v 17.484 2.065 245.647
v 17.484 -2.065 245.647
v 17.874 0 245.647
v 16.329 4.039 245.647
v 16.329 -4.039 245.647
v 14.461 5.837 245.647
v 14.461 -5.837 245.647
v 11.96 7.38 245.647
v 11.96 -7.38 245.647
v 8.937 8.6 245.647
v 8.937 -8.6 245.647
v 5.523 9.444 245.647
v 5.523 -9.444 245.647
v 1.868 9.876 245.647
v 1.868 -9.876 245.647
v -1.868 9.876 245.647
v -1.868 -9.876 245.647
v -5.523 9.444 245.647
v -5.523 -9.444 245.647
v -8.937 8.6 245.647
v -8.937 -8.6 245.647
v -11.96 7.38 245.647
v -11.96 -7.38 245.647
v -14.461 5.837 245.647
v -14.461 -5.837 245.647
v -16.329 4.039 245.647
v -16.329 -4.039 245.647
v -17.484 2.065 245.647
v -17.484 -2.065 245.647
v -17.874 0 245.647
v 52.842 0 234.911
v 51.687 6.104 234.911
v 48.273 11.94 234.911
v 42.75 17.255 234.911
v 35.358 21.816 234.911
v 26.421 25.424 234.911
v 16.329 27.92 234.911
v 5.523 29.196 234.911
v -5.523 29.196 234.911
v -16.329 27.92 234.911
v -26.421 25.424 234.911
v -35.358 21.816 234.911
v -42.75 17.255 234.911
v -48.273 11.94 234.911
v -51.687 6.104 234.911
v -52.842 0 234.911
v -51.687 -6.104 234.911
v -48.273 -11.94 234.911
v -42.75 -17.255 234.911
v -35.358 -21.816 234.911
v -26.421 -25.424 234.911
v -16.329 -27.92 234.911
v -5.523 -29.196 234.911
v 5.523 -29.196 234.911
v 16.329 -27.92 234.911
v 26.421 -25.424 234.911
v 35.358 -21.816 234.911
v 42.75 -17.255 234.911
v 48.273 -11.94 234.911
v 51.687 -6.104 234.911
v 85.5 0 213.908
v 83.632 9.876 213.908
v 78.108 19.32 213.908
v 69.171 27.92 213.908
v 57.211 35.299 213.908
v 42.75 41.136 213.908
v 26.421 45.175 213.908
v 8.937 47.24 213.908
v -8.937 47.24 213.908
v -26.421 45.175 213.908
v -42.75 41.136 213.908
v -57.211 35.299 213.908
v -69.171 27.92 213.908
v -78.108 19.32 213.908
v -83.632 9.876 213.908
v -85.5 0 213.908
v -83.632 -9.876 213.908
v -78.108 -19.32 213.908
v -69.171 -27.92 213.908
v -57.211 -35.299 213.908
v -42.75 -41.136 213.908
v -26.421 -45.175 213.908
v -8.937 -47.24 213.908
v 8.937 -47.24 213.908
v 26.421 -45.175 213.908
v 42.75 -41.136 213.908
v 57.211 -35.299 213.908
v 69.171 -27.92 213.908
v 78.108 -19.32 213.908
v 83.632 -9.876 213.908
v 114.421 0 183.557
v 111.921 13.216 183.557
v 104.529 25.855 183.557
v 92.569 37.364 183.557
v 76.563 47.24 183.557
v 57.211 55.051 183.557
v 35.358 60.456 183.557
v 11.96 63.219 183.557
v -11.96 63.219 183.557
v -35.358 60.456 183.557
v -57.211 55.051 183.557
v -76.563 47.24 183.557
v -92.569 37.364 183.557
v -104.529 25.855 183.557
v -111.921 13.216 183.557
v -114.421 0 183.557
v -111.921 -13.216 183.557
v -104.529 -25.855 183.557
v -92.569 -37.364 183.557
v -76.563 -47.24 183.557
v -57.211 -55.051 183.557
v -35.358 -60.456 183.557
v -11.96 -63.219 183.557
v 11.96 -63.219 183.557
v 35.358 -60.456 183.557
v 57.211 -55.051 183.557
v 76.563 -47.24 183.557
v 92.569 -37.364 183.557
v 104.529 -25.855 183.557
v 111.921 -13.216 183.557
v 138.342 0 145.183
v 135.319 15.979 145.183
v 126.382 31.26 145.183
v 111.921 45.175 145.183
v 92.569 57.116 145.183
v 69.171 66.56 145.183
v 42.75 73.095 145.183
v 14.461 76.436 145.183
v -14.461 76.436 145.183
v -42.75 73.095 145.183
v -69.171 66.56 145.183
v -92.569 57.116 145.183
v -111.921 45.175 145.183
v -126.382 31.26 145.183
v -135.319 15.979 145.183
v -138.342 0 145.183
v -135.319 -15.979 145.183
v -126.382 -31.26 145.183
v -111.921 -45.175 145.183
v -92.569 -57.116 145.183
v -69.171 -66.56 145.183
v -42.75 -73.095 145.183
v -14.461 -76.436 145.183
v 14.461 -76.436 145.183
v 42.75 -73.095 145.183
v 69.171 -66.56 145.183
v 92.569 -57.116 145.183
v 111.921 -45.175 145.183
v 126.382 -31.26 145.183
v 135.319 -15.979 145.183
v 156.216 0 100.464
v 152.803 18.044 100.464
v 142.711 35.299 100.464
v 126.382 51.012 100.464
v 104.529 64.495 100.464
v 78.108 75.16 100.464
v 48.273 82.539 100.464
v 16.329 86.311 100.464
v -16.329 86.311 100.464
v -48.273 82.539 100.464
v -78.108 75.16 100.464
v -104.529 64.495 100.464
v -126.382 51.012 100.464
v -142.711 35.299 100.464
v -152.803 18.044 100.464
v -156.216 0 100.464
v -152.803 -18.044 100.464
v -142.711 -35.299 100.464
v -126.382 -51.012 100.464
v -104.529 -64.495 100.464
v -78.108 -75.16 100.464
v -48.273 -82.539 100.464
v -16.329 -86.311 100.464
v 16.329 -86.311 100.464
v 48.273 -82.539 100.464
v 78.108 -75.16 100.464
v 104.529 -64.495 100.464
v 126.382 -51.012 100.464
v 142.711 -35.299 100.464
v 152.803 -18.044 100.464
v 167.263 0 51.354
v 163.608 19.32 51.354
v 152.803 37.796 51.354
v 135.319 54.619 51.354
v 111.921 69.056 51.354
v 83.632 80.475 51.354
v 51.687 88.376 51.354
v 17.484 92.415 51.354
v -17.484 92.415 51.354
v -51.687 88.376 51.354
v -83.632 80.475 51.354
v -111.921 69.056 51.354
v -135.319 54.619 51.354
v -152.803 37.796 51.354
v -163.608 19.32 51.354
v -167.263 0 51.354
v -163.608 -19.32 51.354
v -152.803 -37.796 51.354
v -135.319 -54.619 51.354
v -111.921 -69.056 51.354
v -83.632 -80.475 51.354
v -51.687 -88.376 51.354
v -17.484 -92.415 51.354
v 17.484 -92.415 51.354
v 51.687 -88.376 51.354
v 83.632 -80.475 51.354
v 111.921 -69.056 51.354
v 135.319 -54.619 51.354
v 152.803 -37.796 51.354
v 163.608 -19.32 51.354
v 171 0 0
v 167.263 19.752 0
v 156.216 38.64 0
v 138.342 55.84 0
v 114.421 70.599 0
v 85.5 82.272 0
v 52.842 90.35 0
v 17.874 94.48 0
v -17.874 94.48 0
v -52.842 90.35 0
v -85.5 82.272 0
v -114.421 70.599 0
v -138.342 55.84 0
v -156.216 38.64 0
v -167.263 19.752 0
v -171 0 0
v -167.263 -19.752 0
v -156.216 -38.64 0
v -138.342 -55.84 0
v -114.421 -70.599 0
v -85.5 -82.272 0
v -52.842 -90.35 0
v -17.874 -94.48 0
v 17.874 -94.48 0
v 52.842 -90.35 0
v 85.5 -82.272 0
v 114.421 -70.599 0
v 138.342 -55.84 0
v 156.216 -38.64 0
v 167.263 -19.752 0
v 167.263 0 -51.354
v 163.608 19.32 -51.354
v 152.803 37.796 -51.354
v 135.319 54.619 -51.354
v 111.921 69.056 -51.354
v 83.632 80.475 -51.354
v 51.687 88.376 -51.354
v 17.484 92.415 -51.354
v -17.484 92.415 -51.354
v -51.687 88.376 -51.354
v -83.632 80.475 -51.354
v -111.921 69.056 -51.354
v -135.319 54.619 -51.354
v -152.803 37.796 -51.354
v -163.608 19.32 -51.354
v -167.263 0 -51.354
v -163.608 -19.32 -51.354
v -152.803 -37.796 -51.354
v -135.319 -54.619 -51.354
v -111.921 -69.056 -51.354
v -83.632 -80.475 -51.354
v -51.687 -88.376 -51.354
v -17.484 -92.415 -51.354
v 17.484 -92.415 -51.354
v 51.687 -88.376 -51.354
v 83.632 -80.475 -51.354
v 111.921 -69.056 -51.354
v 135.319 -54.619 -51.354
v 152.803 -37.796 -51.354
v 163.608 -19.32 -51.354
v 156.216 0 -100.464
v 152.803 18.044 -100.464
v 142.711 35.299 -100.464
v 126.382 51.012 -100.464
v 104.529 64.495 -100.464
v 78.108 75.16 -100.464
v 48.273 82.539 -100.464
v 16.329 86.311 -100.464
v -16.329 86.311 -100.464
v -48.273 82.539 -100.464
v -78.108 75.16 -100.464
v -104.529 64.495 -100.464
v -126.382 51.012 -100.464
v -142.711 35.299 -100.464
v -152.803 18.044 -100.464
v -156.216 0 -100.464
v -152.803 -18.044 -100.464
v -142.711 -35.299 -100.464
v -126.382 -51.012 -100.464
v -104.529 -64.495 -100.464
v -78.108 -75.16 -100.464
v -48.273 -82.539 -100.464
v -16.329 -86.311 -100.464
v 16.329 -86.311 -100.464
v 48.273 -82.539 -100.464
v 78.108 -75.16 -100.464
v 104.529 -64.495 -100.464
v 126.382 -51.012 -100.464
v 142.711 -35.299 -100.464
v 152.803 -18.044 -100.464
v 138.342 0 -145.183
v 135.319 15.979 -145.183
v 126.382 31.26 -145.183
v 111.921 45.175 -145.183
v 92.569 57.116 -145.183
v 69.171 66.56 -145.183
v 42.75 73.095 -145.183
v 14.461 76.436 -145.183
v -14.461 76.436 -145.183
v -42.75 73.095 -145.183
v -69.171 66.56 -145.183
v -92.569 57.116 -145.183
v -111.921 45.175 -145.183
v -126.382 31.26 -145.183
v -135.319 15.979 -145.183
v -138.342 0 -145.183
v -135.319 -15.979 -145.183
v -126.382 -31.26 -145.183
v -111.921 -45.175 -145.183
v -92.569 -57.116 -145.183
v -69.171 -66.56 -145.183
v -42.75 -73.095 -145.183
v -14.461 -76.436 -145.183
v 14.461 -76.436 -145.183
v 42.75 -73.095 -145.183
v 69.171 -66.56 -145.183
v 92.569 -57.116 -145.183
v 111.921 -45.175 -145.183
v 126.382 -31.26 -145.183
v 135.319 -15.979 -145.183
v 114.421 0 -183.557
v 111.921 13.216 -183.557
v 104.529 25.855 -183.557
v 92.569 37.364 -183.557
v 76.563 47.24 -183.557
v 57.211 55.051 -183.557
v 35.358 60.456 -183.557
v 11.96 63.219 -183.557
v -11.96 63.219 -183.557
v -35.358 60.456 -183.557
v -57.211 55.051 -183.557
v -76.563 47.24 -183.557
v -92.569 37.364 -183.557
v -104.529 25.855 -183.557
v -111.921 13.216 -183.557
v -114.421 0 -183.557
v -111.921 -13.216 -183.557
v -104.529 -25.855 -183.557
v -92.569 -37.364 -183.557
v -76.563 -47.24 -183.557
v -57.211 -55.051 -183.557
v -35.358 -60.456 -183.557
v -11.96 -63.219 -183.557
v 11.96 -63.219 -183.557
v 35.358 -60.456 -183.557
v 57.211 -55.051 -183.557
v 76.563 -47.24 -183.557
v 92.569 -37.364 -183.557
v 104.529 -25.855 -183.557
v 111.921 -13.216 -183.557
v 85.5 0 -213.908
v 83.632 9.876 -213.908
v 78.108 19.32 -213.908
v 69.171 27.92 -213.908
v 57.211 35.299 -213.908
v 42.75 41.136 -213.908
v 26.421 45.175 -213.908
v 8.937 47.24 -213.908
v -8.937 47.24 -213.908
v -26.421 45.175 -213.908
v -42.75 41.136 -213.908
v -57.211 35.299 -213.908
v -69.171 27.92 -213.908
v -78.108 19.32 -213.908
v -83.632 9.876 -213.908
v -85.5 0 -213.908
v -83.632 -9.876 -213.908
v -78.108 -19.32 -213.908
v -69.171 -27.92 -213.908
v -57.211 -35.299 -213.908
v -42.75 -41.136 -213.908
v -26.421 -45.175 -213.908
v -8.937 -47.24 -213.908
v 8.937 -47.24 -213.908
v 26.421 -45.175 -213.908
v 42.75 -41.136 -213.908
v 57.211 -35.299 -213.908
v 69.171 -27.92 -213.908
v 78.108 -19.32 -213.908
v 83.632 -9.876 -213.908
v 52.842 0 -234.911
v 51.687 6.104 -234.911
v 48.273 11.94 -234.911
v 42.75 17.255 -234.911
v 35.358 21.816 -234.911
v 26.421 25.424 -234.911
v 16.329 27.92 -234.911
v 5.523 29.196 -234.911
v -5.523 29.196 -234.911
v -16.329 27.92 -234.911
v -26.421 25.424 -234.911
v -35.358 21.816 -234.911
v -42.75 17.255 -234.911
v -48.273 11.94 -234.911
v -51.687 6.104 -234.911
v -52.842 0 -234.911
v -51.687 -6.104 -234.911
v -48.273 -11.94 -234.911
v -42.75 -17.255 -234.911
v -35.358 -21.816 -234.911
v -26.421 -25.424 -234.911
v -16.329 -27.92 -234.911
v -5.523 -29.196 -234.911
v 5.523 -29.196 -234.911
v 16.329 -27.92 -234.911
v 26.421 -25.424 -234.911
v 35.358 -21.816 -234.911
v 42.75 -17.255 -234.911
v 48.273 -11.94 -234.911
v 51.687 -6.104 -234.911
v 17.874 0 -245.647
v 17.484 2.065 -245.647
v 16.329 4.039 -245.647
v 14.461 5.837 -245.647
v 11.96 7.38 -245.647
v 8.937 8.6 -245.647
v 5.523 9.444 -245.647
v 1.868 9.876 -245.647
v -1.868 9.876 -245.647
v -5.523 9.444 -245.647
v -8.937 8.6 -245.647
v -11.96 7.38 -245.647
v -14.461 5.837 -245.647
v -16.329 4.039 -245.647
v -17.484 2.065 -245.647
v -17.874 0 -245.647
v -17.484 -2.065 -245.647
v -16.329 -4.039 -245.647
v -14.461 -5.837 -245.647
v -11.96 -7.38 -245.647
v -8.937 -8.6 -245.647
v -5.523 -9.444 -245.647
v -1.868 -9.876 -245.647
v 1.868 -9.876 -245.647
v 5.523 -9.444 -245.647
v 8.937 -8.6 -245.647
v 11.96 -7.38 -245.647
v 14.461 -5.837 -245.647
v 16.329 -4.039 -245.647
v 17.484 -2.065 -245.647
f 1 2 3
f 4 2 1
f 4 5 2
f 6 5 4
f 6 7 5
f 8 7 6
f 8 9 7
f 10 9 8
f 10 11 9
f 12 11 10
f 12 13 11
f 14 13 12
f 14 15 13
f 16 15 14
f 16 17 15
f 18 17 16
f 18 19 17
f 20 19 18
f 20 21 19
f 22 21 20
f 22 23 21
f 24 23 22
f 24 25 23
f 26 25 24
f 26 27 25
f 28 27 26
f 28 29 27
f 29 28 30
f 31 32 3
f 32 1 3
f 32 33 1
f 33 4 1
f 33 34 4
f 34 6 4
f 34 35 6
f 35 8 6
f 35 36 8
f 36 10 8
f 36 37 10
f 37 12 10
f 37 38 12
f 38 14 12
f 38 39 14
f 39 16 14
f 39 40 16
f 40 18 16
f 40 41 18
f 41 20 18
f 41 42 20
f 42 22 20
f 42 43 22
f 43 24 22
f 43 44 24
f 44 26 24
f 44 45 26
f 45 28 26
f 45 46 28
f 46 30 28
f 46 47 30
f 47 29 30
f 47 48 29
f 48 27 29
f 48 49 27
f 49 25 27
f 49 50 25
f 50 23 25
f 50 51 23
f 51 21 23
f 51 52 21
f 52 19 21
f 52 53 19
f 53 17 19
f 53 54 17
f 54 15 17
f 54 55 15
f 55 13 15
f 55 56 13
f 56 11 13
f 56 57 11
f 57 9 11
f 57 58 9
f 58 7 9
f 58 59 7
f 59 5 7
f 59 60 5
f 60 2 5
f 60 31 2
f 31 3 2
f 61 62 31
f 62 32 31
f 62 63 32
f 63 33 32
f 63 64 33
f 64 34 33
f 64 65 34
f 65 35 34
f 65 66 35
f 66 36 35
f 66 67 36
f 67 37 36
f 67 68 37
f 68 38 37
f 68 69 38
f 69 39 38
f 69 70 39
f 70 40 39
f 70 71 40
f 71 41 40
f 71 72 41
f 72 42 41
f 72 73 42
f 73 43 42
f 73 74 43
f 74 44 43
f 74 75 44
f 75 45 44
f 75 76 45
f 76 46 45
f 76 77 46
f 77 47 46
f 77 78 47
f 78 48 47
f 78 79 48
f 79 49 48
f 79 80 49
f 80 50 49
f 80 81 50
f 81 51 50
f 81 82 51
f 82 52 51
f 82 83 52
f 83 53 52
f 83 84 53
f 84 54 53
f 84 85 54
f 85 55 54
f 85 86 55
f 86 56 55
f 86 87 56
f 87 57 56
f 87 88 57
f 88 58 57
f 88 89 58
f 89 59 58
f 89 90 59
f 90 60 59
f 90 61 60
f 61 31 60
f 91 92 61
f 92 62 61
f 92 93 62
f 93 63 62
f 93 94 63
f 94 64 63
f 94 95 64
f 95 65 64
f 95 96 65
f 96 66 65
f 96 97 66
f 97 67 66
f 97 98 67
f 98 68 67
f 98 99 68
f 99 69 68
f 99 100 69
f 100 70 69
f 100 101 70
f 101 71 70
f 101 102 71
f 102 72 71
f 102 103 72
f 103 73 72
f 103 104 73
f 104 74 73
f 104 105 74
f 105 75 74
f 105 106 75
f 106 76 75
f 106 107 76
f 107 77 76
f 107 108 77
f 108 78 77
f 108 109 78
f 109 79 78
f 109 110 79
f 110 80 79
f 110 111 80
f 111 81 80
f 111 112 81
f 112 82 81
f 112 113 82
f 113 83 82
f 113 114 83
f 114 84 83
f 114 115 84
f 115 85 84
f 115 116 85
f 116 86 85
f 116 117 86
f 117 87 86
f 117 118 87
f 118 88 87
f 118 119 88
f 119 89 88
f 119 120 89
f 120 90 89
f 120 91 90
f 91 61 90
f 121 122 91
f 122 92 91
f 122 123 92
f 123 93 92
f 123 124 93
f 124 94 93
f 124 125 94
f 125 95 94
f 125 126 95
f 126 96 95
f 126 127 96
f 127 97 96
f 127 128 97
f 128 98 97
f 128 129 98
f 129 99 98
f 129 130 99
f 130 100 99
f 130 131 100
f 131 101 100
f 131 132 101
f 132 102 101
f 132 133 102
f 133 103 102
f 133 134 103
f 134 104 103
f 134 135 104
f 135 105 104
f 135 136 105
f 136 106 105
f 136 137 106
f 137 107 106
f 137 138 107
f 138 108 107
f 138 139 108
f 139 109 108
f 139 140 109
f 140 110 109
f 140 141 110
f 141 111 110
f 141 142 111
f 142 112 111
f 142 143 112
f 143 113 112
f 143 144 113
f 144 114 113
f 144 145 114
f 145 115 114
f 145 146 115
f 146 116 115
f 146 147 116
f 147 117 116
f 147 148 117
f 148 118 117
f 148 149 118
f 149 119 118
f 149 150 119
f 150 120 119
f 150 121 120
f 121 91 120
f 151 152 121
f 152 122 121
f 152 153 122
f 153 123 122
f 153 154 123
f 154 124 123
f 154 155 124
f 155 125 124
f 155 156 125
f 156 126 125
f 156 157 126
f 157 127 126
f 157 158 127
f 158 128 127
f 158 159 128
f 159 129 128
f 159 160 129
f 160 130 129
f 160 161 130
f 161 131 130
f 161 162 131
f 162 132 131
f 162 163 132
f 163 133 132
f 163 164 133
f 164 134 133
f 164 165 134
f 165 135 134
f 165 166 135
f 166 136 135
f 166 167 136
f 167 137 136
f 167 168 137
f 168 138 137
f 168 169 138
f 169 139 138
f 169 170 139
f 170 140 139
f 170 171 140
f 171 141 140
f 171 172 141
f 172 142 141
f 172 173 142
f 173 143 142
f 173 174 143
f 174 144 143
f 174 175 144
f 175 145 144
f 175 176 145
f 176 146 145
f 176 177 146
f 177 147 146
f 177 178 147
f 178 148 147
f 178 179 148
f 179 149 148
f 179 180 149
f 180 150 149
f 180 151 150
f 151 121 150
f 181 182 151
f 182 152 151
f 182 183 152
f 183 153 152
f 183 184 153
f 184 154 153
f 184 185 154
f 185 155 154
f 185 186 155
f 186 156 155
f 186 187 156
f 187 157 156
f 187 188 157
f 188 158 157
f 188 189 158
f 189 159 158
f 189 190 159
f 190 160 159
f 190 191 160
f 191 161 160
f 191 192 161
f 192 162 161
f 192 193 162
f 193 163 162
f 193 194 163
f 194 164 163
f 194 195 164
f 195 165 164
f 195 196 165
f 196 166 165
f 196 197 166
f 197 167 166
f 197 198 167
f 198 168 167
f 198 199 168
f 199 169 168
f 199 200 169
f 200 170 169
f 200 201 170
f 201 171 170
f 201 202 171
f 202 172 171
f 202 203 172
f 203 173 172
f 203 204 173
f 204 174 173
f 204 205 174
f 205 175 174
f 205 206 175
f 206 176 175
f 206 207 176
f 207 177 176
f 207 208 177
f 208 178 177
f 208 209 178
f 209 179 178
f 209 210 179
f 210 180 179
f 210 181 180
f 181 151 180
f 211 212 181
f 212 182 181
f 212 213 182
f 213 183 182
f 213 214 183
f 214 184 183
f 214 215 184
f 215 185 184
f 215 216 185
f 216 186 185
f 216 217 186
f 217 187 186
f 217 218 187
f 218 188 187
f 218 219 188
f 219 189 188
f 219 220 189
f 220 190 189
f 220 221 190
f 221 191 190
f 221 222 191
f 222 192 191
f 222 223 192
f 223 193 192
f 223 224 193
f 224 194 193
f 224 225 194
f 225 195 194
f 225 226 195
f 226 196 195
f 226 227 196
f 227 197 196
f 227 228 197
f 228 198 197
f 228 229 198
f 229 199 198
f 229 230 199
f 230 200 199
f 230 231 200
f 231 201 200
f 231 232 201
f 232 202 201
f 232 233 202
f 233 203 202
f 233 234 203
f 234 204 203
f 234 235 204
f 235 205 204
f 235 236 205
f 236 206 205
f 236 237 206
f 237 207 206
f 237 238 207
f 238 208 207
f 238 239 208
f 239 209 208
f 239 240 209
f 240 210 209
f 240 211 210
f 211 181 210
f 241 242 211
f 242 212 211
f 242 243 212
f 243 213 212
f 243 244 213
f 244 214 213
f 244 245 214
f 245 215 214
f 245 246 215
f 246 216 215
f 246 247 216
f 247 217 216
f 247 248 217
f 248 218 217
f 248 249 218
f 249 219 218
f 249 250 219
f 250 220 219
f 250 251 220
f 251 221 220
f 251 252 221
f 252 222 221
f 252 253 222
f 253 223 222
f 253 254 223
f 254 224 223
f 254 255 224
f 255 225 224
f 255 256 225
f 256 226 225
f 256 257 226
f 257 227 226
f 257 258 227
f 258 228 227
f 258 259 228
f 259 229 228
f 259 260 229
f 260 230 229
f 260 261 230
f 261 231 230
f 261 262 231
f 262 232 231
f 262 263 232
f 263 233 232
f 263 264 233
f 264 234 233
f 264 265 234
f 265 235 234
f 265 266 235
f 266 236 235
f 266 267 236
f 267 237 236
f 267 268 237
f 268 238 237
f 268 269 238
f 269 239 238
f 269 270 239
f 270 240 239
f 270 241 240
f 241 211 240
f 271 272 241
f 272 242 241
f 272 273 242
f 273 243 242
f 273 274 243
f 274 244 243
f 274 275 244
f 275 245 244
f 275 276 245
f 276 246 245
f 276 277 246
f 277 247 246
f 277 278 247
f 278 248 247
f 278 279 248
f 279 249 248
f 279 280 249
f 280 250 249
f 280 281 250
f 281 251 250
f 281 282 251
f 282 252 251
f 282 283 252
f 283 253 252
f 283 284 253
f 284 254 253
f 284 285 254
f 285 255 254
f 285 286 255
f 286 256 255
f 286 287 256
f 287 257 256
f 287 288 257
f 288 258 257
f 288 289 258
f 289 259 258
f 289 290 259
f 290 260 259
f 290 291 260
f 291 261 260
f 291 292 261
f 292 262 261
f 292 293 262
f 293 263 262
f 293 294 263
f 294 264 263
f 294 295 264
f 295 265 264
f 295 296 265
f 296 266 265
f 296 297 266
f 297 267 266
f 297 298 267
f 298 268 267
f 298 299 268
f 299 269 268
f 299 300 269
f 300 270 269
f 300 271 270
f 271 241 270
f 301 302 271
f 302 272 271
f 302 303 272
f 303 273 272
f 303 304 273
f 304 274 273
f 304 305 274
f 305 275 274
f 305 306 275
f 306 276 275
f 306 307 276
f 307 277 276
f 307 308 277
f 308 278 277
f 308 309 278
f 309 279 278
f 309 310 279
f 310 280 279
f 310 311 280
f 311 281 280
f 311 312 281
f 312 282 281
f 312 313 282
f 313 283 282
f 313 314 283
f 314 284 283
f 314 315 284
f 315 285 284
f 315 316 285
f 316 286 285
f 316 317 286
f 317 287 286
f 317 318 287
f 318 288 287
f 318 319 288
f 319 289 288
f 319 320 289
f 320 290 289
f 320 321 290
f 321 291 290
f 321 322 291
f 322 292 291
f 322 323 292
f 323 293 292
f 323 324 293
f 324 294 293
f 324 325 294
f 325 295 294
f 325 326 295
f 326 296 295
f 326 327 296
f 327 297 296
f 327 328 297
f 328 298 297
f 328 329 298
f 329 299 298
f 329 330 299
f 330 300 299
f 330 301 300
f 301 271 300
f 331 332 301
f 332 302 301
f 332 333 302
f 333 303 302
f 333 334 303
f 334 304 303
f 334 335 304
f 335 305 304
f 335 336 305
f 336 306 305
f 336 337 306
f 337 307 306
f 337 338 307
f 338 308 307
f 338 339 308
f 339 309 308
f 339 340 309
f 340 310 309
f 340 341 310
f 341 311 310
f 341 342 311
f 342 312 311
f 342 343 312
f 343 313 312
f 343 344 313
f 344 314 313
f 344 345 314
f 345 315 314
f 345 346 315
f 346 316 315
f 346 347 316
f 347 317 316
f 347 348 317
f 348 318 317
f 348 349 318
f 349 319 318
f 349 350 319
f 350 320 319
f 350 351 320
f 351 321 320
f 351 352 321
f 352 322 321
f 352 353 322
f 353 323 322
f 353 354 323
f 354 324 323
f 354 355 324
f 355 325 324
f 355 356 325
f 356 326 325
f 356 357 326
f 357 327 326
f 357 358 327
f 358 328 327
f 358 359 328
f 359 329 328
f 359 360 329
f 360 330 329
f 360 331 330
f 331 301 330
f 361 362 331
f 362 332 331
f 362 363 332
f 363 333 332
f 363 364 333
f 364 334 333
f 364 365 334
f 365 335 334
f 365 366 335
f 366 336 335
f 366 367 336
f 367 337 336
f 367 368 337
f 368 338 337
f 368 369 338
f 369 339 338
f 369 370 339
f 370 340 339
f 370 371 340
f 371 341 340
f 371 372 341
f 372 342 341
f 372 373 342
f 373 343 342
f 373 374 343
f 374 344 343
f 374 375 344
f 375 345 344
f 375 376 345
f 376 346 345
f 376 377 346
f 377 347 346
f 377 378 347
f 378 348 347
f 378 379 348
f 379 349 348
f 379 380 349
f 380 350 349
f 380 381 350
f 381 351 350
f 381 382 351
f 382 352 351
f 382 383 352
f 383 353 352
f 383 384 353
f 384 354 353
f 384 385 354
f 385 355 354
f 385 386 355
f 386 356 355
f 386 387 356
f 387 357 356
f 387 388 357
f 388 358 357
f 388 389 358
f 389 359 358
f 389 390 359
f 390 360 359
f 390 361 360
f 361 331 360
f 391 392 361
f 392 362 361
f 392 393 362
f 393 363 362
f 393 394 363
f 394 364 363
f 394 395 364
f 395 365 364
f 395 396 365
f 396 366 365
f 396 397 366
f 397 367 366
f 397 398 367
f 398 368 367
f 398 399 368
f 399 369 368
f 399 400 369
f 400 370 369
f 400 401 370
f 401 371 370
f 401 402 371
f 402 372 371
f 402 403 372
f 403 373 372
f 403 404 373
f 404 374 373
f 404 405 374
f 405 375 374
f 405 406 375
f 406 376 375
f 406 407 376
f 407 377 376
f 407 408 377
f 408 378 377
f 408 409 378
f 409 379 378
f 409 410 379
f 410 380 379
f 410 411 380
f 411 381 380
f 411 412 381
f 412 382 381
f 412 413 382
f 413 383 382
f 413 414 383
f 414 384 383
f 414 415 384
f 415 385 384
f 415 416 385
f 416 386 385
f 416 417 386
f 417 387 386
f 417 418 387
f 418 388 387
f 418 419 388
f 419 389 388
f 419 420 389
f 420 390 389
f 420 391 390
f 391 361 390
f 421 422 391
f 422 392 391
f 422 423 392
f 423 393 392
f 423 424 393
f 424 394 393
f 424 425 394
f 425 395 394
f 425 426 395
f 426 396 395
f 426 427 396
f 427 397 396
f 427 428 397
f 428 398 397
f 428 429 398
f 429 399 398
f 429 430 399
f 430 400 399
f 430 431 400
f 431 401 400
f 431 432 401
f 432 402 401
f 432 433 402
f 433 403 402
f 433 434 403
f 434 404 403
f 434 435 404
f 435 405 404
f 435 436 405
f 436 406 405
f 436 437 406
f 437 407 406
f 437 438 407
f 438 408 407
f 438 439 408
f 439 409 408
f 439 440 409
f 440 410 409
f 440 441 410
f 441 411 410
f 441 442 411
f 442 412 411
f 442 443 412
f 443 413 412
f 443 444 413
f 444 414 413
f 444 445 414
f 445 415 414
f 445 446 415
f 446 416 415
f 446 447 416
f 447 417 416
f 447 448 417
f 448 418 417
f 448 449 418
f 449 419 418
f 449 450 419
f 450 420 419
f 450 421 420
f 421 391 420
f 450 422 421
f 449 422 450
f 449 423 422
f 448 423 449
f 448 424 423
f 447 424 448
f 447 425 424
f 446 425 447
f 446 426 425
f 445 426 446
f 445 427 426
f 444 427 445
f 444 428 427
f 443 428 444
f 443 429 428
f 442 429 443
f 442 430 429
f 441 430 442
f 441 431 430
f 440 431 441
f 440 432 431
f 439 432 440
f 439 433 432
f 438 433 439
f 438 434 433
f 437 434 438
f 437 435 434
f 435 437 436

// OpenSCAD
// Generated by SolidPython 1.0.1 on 2020-07-29 00:46:48


scale(v = [9, 5, 13]) {
	sphere(r = 19);
}
/***********************************************
*********      SolidPython code:      **********
************************************************
 
# import packages: SolidPython
from solid import *
from solid.utils import *
from itertools import chain, combinations, permutations


class Resize:

    def __init__(self, scad_file):
        self.scad_file = scad_file
        #self.scad_file = import_scad(scad_file)
        # cone/cylinder param:
        self.r1 = 0
        self.r2 = 0
        self.h = 0
        # rectangular prism param:
        self.w = 0
        self.l = 0
        # ellipse param:
        self.r = 0

    # import OpenScad code (file name corresponds to shape)


    # classify shape + parameters
    def assign(self, param1, param2, param3):
        if self.scad_file == 'cone.scad':
            self.r1 = param1
            self.r2 = param2
            self.h = param3
        elif self.scad_file == 'cylinder.scad':
            self.r1 = param1
            self.r2 = param2
            self.h = param3
        elif self.scad_file == 'rectangularPrism.scad':
            self.h = param1
            self.l = param2
            self.w = param3
        else:
            self.r = param1
            self.h = param2

    # resize parameters
    def iterate(self):
        x = range(3, 20, 2)
        i = 1
        if self.scad_file == 'cone.scad':
            tempList = list(permutations(x, 2))
            for temp in tempList:
                param1 = temp[0]
                param2 = temp[1]
                filepath = 'produced_scad_files/' + 'cone' + str(param1) + '_' + str(param2) + '_' + '.scad'
                scad_render_to_file(cylinder(h=param1, r1=param2, r2=0), filepath)

        elif self.scad_file == 'cylinder.scad':
            tempList = list(permutations(x, 3))
            for temp in tempList:
                param1 = temp[0]
                param2 = temp[1]
                filepath = 'produced_scad_files/' + 'cylinder' + str(param1) + '_' + str(param2) + '_' + '.scad'
                scad_render_to_file(cylinder(h=param1, r1=param2, r2=param2), filepath)

        elif self.scad_file == 'rectangularPrism.scad':
            tempList = list(permutations(x, 3))
            for temp in tempList:
                param1 = temp[0]
                param2 = temp[1]
                param3 = temp[2]
                filepath = 'produced_scad_files/' + 'rectangularPrism' + str(param1) + '_' + str(param2) + '_' + str(
                    param3) + '.scad'
                scad_render_to_file(cube(size=(param1, param2, param3)), filepath)

        elif self.scad_file == 'ellipse.scad':
            tempList = list(permutations(x, 4))
            for temp in tempList:
                param1 = temp[0]
                param2 = temp[1]
                param3 = temp[2]
                param4 = temp[3]
                filepath = 'produced_scad_files/' + 'ellipse' + str(param1) + '_' + str(param2) + '_' + str(param3) + '_' + str(param4) + '.scad'
                scad_render_to_file(scale([param1, param2, param3])(sphere(r=param4)), filepath)

    def render_to_scadfile(self):
        scad_render_to_file(scad, 'example.scad') 
 
************************************************/
